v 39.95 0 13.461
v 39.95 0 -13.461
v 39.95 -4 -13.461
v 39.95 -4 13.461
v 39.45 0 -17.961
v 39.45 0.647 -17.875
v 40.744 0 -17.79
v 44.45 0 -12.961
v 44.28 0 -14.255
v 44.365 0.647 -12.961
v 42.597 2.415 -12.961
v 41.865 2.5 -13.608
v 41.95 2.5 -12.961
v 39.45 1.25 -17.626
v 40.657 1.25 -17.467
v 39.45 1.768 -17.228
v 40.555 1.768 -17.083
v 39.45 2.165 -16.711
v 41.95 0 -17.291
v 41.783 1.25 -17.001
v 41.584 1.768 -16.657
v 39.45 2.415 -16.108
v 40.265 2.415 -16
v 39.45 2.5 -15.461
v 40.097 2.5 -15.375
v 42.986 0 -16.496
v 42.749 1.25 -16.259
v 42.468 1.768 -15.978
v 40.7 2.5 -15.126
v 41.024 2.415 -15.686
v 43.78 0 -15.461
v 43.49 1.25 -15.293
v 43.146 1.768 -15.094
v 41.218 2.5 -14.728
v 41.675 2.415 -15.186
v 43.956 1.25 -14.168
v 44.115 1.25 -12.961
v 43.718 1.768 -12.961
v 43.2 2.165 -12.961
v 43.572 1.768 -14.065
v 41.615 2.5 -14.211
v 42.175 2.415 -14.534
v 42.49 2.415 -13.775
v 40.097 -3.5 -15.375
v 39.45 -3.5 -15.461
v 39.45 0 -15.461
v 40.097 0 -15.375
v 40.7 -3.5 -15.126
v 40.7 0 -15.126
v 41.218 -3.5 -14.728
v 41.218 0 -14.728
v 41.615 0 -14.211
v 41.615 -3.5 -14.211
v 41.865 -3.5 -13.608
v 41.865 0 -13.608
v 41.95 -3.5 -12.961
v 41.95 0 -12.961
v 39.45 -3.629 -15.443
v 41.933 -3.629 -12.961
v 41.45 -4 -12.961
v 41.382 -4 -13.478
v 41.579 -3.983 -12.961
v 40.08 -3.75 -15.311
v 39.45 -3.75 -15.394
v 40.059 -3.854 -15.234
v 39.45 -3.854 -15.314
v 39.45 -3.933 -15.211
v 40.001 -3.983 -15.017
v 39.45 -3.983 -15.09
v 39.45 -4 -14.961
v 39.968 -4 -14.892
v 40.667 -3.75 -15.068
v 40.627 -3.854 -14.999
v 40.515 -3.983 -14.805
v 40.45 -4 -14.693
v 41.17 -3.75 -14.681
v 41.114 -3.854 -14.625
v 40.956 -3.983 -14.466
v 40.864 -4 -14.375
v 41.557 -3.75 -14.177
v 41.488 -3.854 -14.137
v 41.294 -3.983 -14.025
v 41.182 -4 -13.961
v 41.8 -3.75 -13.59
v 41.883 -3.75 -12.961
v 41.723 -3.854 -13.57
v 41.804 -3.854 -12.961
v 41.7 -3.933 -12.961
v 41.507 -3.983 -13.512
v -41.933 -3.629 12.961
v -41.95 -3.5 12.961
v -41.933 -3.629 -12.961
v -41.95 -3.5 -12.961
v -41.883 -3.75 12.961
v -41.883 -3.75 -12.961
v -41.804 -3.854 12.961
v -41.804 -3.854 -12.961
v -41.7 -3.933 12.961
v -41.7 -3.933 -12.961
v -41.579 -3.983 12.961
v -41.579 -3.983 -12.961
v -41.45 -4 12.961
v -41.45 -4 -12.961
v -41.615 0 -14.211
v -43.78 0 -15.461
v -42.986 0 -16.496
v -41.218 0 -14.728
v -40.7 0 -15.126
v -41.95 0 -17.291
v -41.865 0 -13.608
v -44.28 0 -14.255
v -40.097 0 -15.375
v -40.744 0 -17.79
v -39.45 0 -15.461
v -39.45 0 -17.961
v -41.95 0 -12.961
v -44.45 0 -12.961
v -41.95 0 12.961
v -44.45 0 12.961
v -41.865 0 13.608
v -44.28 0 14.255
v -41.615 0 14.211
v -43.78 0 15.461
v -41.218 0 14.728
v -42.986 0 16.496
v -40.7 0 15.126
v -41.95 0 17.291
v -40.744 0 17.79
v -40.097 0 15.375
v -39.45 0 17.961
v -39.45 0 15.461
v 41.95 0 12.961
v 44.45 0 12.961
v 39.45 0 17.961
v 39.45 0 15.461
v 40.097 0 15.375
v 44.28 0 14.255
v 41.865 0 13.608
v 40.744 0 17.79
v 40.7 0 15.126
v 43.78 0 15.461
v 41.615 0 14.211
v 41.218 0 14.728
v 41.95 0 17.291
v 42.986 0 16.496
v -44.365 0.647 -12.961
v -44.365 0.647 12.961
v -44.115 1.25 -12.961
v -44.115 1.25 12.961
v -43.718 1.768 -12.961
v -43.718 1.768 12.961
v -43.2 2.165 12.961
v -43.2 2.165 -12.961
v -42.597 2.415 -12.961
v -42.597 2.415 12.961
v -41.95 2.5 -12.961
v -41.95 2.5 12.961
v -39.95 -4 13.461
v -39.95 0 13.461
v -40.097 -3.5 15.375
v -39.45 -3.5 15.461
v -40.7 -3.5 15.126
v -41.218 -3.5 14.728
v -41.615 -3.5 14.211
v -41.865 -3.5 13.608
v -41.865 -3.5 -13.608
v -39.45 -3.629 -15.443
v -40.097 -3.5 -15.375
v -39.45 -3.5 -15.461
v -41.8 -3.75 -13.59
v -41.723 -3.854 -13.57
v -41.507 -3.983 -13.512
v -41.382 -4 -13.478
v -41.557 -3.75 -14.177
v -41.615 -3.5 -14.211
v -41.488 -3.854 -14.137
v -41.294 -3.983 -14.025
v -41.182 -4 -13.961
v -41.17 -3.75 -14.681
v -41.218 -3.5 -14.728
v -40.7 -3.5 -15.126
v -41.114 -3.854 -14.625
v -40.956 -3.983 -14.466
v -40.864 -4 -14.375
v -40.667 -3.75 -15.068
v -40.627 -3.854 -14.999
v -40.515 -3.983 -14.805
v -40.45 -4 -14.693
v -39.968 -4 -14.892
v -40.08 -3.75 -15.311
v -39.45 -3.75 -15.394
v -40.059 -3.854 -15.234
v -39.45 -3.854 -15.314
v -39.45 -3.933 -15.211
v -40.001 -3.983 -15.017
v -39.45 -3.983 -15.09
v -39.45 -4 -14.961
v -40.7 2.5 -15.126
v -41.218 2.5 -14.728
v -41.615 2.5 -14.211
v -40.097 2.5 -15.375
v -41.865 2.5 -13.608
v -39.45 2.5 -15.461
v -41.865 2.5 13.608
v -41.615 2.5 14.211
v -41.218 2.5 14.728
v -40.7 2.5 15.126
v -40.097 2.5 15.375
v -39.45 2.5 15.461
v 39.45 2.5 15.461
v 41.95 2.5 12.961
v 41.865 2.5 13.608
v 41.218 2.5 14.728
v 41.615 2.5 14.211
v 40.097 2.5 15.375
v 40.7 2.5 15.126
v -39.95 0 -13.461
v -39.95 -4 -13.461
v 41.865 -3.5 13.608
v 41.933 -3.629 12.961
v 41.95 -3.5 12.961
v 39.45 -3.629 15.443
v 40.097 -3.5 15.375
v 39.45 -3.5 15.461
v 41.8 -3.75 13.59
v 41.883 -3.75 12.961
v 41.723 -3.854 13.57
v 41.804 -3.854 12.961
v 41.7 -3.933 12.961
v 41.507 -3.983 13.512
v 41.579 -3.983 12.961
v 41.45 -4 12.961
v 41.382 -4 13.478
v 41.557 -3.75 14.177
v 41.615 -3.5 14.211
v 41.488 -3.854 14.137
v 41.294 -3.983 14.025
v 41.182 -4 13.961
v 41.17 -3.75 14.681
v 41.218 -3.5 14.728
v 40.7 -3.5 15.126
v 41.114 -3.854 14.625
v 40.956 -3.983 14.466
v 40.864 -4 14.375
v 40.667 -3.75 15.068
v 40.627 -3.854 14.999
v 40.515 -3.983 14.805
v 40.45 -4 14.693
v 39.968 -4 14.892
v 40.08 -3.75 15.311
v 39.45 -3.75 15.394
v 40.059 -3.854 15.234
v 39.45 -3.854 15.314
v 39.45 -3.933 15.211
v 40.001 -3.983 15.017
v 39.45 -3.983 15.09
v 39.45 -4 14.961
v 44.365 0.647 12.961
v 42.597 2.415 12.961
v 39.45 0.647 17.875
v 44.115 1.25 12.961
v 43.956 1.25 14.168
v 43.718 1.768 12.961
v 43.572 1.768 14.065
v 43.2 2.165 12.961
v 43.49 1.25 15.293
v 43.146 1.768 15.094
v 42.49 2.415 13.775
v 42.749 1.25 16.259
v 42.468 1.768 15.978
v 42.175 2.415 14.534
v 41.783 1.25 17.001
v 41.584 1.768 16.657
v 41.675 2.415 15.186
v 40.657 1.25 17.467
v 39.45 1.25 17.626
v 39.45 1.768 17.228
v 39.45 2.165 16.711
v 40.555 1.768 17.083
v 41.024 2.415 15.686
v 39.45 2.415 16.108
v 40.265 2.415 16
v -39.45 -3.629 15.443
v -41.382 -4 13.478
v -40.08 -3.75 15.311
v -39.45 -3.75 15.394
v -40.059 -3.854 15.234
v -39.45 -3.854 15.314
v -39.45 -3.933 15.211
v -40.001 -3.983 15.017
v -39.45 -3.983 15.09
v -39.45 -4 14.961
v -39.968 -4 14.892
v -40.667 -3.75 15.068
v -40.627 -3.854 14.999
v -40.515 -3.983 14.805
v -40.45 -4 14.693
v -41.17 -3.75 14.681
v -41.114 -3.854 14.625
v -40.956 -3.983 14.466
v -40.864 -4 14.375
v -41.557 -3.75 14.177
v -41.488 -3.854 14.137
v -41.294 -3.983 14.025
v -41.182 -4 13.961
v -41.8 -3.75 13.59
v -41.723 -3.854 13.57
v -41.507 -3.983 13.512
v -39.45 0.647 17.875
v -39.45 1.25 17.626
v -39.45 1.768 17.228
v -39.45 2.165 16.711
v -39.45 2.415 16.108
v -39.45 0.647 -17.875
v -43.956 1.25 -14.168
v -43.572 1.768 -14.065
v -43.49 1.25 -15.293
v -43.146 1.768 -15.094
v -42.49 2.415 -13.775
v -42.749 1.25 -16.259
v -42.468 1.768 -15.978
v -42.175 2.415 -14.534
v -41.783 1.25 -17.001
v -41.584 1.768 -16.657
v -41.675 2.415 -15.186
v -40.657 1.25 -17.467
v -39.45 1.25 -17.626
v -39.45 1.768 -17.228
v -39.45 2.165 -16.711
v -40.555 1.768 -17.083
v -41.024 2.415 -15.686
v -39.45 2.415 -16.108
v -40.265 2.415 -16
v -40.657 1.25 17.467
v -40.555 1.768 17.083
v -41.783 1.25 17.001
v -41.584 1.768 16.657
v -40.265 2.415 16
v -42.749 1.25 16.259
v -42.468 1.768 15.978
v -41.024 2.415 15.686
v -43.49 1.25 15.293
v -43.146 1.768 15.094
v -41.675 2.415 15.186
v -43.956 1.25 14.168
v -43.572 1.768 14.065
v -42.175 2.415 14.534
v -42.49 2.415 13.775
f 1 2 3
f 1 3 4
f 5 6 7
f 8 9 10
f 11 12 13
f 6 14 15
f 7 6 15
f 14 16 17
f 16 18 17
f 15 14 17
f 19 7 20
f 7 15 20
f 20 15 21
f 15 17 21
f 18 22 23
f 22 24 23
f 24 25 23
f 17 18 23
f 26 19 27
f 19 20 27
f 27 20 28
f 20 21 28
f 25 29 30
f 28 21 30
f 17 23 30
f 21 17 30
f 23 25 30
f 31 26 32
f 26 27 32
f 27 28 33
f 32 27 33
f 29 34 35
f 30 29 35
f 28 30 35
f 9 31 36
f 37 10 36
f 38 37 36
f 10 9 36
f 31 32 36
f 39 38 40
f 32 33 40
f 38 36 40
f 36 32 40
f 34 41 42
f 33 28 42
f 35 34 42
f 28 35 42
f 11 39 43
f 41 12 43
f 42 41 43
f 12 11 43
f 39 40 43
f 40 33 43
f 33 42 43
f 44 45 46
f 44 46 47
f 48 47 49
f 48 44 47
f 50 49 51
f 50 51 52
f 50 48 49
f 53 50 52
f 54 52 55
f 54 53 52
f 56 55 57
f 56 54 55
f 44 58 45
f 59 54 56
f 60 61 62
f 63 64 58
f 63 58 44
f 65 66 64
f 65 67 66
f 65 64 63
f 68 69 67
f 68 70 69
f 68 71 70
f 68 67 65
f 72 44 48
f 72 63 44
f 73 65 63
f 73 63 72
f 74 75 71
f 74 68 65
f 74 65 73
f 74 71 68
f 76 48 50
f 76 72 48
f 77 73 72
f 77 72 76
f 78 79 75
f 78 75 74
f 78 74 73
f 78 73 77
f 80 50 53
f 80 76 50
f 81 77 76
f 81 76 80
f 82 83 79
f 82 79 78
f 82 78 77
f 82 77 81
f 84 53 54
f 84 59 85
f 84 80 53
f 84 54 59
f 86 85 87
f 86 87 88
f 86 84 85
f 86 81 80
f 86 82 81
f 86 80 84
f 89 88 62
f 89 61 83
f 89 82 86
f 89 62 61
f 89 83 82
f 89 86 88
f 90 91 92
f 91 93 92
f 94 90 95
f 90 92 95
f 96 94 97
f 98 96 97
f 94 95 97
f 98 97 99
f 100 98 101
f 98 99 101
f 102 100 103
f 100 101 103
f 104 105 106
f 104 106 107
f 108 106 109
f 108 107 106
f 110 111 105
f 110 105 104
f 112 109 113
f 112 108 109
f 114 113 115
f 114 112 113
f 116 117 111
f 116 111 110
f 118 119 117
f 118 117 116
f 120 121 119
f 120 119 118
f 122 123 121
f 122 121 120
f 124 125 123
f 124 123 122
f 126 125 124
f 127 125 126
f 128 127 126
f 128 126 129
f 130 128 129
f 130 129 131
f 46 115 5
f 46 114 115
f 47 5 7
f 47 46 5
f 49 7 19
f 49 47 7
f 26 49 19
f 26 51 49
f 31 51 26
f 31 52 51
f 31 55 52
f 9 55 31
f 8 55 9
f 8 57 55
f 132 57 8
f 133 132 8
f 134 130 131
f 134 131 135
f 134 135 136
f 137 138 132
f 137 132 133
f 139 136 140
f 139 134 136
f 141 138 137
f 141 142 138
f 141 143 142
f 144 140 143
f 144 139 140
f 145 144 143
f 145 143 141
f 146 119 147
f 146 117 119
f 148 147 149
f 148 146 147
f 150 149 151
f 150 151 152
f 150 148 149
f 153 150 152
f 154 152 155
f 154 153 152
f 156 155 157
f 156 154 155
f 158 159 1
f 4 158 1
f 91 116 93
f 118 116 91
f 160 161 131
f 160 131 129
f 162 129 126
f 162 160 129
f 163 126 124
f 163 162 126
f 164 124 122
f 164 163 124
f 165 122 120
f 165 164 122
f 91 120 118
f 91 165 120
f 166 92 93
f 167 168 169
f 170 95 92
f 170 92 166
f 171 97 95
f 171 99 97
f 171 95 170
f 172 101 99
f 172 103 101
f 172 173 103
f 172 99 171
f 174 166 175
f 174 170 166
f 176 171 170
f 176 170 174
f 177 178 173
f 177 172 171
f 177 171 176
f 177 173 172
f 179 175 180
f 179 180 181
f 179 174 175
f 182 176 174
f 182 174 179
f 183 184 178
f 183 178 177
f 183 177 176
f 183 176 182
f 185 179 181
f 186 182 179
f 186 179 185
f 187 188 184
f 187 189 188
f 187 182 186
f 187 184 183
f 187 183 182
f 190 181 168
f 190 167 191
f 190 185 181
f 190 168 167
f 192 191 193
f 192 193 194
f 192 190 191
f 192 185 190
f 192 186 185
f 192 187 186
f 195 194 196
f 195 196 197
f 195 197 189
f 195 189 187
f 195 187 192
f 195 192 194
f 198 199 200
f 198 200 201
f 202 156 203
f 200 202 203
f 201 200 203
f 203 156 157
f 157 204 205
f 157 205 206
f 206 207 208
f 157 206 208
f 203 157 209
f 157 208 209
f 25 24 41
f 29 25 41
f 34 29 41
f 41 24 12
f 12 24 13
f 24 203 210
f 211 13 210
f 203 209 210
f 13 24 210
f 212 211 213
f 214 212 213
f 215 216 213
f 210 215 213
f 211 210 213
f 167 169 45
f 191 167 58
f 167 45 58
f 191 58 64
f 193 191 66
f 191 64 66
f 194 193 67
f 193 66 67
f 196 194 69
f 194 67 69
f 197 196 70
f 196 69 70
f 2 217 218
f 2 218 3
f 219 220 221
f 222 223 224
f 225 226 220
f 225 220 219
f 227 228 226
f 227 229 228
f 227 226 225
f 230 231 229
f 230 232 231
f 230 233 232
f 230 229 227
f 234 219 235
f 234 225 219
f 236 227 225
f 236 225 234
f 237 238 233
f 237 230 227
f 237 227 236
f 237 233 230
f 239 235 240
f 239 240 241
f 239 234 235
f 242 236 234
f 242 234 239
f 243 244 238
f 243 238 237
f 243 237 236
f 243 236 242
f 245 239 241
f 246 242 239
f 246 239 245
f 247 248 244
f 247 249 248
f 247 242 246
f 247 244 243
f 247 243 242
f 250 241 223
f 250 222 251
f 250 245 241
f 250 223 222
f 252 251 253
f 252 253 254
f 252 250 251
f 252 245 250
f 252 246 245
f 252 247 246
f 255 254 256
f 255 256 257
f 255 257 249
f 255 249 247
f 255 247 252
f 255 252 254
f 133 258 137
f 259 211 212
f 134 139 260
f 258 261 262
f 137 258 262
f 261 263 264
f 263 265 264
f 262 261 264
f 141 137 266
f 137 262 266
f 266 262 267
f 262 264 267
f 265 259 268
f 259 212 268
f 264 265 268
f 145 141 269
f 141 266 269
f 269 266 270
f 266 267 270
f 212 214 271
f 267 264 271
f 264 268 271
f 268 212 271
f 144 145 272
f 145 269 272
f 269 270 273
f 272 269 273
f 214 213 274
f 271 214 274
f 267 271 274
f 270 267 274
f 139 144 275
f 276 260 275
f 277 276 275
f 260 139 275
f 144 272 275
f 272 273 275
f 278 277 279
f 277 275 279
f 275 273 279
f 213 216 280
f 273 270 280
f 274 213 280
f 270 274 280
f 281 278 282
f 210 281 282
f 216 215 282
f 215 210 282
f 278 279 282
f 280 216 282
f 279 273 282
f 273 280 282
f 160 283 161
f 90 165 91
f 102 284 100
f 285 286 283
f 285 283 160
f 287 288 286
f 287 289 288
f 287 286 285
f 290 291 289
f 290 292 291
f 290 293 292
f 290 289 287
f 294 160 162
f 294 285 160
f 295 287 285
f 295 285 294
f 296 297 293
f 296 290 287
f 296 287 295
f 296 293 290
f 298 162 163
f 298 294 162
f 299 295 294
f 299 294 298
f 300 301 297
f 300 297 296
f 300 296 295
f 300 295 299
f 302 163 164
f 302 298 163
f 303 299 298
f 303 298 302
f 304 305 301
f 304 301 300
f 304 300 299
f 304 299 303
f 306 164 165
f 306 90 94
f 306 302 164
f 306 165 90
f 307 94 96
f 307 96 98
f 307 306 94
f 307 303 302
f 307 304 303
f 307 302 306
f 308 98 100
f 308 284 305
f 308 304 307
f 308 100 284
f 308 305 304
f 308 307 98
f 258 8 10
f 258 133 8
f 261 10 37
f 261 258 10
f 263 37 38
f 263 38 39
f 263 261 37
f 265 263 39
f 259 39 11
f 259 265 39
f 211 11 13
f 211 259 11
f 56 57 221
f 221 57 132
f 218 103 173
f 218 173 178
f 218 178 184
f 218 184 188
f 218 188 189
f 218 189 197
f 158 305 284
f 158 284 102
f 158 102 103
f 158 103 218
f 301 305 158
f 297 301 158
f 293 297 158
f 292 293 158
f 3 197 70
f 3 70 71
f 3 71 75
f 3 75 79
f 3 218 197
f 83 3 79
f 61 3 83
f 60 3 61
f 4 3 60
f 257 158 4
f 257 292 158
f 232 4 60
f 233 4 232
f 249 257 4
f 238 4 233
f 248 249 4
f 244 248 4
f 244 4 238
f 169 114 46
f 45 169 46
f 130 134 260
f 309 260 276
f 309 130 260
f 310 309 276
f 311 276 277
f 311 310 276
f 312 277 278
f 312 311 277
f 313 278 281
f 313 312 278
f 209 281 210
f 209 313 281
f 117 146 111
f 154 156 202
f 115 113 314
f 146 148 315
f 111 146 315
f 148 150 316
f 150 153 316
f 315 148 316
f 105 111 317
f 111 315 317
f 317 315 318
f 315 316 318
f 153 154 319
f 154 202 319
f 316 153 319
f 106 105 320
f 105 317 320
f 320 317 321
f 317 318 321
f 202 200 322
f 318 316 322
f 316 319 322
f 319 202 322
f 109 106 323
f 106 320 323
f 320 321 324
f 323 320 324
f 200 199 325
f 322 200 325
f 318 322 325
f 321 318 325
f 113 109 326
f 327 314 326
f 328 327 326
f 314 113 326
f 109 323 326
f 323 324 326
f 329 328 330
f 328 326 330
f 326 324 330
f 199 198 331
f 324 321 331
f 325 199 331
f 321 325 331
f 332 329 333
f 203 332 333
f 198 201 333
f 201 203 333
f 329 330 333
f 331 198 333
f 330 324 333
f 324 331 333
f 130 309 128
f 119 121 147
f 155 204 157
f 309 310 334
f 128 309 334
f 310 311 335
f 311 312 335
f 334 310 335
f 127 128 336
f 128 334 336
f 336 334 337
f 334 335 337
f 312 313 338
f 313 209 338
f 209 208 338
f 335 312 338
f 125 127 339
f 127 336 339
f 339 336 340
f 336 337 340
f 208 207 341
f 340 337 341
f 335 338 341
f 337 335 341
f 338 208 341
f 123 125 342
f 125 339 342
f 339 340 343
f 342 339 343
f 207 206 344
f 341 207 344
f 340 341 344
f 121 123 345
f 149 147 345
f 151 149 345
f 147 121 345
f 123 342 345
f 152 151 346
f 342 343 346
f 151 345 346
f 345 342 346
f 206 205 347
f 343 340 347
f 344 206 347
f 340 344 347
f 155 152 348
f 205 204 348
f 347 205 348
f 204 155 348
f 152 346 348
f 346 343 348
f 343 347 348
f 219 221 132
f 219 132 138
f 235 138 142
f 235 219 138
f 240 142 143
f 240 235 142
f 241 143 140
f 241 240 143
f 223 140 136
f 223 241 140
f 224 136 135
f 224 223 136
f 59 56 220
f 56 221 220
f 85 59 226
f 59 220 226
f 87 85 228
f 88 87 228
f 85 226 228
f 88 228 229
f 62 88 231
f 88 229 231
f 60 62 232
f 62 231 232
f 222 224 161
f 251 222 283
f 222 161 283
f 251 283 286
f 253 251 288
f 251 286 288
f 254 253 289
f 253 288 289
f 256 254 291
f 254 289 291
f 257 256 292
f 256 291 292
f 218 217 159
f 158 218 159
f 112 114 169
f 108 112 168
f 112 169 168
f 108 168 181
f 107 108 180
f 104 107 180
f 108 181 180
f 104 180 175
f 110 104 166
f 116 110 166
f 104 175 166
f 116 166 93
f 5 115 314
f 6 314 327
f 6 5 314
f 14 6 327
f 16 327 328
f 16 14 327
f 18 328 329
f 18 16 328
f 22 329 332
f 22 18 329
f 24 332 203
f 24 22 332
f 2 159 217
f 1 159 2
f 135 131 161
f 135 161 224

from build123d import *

# Parameters (mm, degrees)
F2_W     = 88.9
F2_H     = 35.9210244843
F3_DEPTH = 2.5
F4_R     = 5
F5_W     = 83.9
F5_H     = 30.9210244843
F5_W_2   = 79.9
F5_H_2   = 26.9210244843
F6_DEPTH = 4
F7_R     = 2.5
F8_R     = 2.49999
F9_R     = 0.5


# Not quite as in the source:
# - a fillet or chamfer is up to 0.001 mm smaller than in the source, because OpenCascade refuses the exact size


with BuildPart() as f3:
    # F2 (on Front) → F3 (new body)
    with BuildSketch(Plane.XZ):
        Rectangle(F2_W, F2_H)
    extrude(amount=-F3_DEPTH)

    # F4
    f4_edges = [f3.edges().sort_by_distance(p)[0] for p in [
        (44.45, 1.25, 17.960512),
        (44.45, 1.25, -17.960512),
        (-44.45, 1.25, -17.960512),
        (-44.45, 1.25, 17.960512),
    ]]
    fillet(f4_edges, radius=F4_R)

    # F5 (on Front) → F6 (join)
    with BuildSketch(Plane.XZ):
        Rectangle(F5_W, F5_H)
        Rectangle(F5_W_2, F5_H_2, mode=Mode.SUBTRACT)
    extrude(amount=F6_DEPTH)

    # F7
    f7_edges = [f3.edges().sort_by_distance(p)[0] for p in [
        (-41.95, -2, -15.460512),
        (-41.95, -2, 15.460512),
        (41.95, -2, -15.460512),
        (41.95, -2, 15.460512),
    ]]
    fillet(f7_edges, radius=F7_R)

    # F8 (radius 2.5 in the source; OpenCascade refuses exactly that, so slightly less here)
    f8_edges = [f3.edges().sort_by_distance(p)[0] for p in [
        (0, 2.5, -17.960512),
    ]]
    fillet(f8_edges, radius=F8_R)

    # F9
    f9_edges = [f3.edges().sort_by_distance(p)[0] for p in [
        (41.95, -4, 0),
    ]]
    fillet(f9_edges, radius=F9_R)


solid = f3.part
